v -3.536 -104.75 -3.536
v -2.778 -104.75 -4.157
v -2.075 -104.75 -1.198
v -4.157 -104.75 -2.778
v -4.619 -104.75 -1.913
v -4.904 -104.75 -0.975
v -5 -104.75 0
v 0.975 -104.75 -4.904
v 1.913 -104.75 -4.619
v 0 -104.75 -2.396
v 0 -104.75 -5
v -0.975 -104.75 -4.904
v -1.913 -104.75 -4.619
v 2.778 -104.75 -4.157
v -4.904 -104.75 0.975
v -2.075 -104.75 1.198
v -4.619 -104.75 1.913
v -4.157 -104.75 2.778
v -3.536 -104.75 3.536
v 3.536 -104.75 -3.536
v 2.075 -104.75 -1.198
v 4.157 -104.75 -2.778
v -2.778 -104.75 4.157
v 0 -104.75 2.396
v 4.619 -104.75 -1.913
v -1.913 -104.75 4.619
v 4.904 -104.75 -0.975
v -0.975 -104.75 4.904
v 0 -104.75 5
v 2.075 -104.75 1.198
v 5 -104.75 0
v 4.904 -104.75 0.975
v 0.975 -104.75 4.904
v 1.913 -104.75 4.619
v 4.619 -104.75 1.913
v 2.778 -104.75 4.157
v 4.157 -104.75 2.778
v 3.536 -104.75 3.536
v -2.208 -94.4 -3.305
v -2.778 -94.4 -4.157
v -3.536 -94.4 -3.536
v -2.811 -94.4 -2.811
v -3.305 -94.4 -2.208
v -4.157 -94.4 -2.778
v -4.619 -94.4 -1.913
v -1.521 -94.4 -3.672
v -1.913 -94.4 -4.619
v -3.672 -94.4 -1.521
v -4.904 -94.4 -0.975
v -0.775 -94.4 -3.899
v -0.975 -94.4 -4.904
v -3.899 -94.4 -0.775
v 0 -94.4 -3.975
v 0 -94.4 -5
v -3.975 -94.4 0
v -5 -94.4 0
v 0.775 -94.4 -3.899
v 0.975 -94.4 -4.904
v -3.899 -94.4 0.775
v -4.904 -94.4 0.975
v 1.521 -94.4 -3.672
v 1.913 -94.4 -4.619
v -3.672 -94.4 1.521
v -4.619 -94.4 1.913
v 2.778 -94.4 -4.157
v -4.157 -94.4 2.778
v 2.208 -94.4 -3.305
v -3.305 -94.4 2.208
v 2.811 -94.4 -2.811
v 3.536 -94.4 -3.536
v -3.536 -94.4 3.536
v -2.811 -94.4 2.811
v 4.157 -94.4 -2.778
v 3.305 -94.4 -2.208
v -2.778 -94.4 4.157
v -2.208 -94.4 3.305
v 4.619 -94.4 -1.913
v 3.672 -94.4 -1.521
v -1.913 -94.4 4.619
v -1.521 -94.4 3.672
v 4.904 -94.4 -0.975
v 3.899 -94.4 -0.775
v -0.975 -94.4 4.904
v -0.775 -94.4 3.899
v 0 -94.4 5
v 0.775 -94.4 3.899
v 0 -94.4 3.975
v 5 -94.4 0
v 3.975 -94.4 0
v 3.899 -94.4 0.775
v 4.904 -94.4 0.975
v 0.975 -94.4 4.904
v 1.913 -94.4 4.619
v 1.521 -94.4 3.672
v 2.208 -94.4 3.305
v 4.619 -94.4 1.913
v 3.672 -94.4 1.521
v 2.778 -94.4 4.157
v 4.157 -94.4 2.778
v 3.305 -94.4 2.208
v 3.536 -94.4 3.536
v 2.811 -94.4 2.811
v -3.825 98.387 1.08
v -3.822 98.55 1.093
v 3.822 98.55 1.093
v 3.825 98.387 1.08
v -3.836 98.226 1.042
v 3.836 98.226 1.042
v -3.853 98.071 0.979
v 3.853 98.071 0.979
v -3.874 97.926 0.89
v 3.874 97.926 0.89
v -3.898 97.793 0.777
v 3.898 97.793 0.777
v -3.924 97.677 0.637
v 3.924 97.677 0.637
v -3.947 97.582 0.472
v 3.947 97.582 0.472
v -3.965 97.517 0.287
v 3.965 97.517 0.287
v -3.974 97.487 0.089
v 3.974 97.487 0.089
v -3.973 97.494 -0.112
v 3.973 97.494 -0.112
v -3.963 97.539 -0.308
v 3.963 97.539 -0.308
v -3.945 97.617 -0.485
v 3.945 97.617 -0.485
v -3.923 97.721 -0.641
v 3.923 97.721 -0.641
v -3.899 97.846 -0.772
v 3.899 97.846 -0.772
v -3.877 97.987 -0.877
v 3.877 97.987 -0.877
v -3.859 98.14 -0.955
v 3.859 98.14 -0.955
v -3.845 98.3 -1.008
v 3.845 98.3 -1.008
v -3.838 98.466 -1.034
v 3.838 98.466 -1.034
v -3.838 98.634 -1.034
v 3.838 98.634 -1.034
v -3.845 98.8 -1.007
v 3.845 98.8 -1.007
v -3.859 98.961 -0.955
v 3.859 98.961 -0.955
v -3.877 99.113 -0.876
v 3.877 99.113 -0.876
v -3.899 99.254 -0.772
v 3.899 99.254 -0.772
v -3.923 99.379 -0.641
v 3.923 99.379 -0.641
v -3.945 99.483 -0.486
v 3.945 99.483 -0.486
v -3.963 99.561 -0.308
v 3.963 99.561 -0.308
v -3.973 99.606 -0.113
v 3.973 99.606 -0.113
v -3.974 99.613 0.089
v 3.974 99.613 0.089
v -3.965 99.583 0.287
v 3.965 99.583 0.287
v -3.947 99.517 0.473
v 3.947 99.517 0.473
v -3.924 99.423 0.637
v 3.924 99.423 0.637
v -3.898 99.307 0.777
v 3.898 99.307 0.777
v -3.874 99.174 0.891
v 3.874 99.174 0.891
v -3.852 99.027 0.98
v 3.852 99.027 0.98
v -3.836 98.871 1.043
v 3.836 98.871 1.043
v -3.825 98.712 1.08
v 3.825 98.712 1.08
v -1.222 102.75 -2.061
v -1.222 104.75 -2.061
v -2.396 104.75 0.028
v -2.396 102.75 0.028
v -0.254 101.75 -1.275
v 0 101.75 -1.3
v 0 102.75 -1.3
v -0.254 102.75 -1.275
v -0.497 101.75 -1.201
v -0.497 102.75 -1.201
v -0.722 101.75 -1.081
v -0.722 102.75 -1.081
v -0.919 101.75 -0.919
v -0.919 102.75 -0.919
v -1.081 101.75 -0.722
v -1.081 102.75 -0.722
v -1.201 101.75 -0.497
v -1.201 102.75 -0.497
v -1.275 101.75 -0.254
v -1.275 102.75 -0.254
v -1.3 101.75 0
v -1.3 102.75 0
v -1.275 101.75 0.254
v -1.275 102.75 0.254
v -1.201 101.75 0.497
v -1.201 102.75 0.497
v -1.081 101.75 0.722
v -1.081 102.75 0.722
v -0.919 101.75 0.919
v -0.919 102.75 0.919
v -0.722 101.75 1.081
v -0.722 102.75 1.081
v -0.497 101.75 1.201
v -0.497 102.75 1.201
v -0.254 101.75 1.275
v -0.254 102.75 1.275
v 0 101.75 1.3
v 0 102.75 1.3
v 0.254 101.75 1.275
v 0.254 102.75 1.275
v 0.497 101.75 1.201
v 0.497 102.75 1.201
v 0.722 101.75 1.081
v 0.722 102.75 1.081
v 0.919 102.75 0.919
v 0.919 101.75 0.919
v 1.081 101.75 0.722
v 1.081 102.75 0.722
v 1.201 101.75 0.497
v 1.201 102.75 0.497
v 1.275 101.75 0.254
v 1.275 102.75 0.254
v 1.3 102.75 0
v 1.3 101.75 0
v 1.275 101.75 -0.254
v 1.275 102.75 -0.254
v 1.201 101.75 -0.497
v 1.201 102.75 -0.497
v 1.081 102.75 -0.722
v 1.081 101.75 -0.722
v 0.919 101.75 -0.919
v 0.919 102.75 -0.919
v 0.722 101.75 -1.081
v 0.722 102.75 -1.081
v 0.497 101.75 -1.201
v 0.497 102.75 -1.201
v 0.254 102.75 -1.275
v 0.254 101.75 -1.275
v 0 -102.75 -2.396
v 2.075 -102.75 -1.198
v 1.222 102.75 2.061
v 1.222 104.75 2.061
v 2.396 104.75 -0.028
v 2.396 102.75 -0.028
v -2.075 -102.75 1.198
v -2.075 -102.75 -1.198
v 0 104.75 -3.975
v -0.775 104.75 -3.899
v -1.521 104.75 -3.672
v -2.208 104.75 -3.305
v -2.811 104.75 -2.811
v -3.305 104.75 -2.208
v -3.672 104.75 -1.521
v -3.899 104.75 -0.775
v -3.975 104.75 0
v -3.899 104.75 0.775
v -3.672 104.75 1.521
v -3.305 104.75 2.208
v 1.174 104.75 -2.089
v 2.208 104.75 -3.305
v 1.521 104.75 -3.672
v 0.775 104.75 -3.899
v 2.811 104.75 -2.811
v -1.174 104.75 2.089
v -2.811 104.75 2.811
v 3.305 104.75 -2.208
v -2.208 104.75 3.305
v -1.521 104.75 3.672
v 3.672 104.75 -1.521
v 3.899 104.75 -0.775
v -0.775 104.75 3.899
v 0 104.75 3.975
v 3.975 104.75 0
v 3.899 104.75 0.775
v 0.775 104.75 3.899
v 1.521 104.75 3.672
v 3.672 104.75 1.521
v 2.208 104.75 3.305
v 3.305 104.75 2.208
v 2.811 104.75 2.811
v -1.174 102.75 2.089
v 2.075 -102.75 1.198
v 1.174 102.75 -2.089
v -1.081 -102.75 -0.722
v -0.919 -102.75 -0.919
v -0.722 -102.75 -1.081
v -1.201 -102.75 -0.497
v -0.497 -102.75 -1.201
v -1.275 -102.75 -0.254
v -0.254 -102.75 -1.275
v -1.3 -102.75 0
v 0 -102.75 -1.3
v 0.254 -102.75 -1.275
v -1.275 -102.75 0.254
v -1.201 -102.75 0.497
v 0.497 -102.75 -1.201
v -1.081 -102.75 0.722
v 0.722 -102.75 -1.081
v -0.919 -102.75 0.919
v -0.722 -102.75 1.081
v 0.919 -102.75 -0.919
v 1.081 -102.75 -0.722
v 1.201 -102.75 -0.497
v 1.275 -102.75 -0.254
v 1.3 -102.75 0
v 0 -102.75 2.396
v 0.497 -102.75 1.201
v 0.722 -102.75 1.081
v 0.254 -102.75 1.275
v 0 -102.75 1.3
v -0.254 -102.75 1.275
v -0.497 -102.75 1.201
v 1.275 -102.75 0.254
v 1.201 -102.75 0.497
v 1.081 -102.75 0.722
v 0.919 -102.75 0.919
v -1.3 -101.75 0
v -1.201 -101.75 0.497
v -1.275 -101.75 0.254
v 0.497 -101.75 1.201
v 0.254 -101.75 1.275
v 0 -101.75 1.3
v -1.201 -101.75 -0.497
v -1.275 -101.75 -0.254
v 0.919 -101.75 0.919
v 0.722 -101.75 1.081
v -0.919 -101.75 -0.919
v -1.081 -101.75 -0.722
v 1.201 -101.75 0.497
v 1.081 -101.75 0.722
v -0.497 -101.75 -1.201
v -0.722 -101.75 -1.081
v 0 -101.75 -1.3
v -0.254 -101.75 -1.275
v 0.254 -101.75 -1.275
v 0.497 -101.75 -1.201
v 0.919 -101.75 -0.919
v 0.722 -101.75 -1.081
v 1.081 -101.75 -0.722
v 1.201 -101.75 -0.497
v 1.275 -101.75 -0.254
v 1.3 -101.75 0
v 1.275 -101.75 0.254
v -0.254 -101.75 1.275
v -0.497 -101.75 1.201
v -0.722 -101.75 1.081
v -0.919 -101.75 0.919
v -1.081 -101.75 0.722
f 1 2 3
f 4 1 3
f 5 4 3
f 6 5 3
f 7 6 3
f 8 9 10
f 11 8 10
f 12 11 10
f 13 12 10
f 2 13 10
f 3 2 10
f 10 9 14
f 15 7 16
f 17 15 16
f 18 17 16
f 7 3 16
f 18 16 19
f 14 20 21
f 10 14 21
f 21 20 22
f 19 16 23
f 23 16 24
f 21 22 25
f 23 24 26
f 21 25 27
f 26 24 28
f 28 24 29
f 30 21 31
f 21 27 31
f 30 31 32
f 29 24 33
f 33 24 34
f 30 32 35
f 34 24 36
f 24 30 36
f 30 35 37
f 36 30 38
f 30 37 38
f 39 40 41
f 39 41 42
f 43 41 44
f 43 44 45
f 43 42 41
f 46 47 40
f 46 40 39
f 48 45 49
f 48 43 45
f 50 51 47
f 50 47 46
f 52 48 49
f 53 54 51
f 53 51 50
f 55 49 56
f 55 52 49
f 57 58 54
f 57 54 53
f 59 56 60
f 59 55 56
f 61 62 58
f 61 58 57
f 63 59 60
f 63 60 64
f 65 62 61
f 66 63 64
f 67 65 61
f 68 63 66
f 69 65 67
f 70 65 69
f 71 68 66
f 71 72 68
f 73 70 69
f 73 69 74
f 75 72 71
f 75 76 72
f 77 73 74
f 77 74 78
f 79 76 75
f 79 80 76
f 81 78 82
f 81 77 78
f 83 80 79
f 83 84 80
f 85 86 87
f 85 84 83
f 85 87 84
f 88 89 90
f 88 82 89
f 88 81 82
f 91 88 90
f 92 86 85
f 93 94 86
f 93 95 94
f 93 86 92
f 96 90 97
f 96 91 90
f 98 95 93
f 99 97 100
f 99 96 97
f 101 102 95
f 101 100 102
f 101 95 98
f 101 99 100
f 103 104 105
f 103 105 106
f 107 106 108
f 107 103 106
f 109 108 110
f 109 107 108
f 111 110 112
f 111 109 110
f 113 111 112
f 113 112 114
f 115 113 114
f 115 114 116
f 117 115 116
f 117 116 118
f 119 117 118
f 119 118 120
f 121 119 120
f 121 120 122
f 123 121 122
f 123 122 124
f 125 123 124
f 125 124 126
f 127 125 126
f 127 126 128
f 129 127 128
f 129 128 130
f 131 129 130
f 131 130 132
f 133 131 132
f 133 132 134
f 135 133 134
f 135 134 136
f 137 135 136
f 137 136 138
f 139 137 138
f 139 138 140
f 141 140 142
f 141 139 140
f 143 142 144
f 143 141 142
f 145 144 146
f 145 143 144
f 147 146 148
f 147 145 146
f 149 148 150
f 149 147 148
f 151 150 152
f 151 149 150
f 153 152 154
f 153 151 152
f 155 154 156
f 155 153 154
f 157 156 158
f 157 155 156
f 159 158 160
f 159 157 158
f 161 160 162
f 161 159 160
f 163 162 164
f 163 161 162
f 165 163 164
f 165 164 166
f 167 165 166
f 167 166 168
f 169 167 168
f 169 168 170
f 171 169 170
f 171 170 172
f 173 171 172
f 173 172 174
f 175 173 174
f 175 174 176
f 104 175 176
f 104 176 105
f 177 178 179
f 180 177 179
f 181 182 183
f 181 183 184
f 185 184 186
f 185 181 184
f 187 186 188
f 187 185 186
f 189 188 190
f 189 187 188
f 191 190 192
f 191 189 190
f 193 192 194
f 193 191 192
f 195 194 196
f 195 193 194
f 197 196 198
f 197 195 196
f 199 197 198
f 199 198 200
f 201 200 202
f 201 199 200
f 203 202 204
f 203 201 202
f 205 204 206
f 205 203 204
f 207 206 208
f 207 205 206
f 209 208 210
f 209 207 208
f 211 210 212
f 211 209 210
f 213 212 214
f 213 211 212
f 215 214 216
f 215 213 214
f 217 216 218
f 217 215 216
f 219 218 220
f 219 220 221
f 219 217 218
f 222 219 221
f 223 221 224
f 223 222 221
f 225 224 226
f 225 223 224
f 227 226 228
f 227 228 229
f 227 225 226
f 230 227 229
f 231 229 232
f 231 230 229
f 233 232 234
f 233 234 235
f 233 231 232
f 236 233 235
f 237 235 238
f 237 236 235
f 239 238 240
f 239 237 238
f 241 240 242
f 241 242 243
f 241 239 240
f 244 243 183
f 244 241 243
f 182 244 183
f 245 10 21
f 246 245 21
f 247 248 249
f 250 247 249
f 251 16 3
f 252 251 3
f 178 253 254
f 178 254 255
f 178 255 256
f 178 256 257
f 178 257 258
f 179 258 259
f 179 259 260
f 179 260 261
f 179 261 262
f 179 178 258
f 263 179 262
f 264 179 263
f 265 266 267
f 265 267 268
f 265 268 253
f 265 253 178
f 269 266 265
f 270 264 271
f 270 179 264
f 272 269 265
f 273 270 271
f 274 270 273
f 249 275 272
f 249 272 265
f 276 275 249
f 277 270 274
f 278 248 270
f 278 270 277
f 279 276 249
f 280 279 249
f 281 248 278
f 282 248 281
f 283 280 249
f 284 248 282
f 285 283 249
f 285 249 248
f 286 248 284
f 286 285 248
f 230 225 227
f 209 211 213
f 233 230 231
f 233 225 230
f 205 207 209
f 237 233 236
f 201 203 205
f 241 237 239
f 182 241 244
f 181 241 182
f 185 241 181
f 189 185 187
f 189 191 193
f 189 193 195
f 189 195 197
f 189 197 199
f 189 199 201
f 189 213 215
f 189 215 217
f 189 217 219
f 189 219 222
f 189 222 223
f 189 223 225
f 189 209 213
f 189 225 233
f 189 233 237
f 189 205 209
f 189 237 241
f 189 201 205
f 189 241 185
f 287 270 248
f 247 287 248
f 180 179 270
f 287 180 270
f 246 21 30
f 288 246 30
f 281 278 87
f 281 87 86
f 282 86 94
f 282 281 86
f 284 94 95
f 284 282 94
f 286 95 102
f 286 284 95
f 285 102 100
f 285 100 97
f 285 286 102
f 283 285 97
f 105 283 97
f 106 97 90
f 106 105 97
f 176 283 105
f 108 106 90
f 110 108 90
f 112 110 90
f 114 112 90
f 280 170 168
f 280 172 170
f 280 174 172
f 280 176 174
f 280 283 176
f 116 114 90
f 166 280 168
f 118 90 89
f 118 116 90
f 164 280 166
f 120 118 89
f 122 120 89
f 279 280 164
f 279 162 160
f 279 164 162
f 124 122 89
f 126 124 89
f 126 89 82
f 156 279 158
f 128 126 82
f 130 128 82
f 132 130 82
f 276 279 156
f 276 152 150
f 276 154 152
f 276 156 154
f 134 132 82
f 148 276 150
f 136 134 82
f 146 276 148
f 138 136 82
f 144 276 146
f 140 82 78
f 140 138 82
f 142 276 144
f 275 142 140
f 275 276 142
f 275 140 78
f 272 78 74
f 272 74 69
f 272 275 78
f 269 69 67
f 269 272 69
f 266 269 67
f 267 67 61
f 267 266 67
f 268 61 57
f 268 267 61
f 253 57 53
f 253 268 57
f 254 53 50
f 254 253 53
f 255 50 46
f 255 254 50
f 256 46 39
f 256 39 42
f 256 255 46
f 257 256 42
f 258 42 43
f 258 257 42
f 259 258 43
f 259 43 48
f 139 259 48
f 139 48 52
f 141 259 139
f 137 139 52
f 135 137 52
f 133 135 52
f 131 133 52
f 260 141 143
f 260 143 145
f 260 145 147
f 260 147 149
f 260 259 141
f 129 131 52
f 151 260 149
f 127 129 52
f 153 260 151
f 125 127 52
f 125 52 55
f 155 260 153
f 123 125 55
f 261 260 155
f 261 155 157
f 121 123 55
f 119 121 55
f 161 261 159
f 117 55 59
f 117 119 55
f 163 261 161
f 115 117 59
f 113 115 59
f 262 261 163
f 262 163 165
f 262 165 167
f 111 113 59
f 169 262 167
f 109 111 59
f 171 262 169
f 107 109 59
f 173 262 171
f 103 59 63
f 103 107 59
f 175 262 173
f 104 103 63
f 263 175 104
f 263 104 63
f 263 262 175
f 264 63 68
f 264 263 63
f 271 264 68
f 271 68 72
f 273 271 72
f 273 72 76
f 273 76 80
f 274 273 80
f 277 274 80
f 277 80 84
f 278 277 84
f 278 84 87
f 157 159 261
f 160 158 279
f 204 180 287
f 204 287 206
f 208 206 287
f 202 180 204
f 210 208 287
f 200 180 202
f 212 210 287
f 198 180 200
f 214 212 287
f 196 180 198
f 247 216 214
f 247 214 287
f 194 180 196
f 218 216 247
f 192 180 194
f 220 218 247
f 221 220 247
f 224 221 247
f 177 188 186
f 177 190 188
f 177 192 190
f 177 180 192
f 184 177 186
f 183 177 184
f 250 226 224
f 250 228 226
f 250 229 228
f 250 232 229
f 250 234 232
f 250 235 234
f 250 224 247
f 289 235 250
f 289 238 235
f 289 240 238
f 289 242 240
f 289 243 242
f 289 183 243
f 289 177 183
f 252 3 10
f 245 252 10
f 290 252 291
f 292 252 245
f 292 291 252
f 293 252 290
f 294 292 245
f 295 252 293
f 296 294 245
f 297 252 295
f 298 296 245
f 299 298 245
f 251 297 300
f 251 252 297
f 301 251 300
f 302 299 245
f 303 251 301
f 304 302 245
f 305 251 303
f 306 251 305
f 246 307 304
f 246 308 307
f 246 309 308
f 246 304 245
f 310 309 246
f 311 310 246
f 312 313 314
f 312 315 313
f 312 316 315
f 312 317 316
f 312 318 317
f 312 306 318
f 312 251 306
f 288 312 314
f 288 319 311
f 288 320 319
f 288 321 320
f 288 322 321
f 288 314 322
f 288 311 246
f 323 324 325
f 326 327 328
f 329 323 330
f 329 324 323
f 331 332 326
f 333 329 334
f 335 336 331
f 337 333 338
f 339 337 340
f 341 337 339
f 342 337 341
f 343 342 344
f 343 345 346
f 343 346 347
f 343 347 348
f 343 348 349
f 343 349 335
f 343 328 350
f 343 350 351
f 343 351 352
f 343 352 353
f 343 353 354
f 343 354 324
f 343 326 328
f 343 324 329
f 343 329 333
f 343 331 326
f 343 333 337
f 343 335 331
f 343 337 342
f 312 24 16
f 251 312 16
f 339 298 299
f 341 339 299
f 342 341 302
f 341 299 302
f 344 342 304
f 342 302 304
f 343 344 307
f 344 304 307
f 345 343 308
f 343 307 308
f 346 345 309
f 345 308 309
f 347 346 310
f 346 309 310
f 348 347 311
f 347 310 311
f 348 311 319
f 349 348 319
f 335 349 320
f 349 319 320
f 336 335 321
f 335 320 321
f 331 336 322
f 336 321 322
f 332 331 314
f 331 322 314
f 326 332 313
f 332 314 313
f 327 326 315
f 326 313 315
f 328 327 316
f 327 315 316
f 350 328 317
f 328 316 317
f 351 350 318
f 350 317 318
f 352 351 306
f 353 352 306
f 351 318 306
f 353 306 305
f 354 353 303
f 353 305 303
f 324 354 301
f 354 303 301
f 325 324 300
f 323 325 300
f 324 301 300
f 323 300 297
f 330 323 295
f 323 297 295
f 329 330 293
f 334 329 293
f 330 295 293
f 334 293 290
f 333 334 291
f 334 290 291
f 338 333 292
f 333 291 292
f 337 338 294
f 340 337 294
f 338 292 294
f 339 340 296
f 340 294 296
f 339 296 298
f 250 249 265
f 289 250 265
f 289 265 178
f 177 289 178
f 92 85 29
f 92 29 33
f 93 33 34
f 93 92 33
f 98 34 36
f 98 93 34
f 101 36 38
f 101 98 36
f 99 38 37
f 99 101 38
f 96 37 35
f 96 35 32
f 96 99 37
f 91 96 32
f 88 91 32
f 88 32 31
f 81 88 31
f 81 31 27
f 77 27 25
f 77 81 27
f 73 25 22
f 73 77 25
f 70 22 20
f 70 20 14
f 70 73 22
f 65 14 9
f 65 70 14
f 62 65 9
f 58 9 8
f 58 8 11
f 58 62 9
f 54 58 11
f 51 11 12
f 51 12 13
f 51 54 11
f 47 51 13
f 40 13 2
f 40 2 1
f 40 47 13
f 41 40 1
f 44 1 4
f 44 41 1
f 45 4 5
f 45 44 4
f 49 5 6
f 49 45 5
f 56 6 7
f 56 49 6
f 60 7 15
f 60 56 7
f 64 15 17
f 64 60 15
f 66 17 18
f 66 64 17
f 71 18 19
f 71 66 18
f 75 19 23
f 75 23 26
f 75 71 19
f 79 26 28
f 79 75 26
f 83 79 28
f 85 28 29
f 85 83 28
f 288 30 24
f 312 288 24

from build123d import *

# Parameters (mm, degrees)
SKETCH1_R               = 5
BOSS_EXTRUDE1_DEPTH     = 104.75
SKETCH5_R               = 5
SKETCH5_R_2             = 3.975
CUT_EXTRUDE3_DEPTH      = 199.15
CUT_EXTRUDE4_DEPTH      = 2
CUT_EXTRUDE5_DEPTH      = 2
SKETCH11_R              = 1.3
CUT_EXTRUDE6_DEPTH      = 1
CUT_EXTRUDE7_START      = -1
SKETCH12_R              = 1.3
CUT_EXTRUDE7_DEPTH      = 1
CUT_EXTRUDE8_DEPTH      = 105.988392216
CUT_EXTRUDE8_DEPTH_BACK = 105.988392216
SKETCH13_R              = 1.065


with BuildPart() as part:
    # Sketch1 → Boss-Extrude1 (new, symmetric)
    with BuildSketch(Plane(origin=(0, 0, 0), x_dir=(1, 0, 0), z_dir=(0, 1, 0))):
        with Locations(Location((0, 0, 0), (0, 0, 270))):
            Circle(SKETCH1_R)
    extrude(amount=BOSS_EXTRUDE1_DEPTH, both=True)

    # Sketch5 → Cut-Extrude3 (cut)
    with BuildSketch(Plane(origin=(0, 104.75, 0), x_dir=(1, 0, 0), z_dir=(0, 1, 0))):
        with Locations(Location((0, 0, 0), (0, 0, 270))):
            Circle(SKETCH5_R)
        with Locations(Location((0, 0, 0), (0, 0, 270))):
            Circle(SKETCH5_R_2, mode=Mode.SUBTRACT)
    extrude(amount=-CUT_EXTRUDE3_DEPTH, mode=Mode.SUBTRACT)

    # Sketch8 → Cut-Extrude4 (cut)
    with BuildSketch(Plane(origin=(0, 104.75, 0), x_dir=(1, 0, 0), z_dir=(0, 1, 0))):
        Polygon((1.173959492, 2.088696351), (-1.221884355, 2.061026918), (-2.395843846, -0.027669433), (-1.173959492, -2.088696351), (1.221884355, -2.061026918), (2.395843846, 0.027669433), align=None)
    extrude(amount=-CUT_EXTRUDE4_DEPTH, mode=Mode.SUBTRACT)

    # Sketch10 → Cut-Extrude5 (cut)
    with BuildSketch(Plane.XZ.offset(104.75)):
        Polygon((0, 2.396003617), (-2.075, 1.198001809), (-2.075, -1.198001809), (0, -2.396003617), (2.075, -1.198001809), (2.075, 1.198001809), align=None)
    extrude(amount=-CUT_EXTRUDE5_DEPTH, mode=Mode.SUBTRACT)

    # Sketch11 → Cut-Extrude6 (cut)
    with BuildSketch(Plane.XZ.offset(102.75)):
        with Locations(Location((0, 0, 0), (0, 0, 270))):
            Circle(SKETCH11_R)
    extrude(amount=-CUT_EXTRUDE6_DEPTH, mode=Mode.SUBTRACT)

    # Sketch12 → Cut-Extrude7 (cut)
    with BuildSketch(Plane(origin=(0, 102.75, 0), x_dir=(1, 0, 0), z_dir=(0, 1, 0)).offset(CUT_EXTRUDE7_START)):
        with Locations(Location((0, 0, 0), (0, 0, 90))):
            Circle(SKETCH12_R)
    extrude(amount=CUT_EXTRUDE7_DEPTH, mode=Mode.SUBTRACT)

    # Sketch13 → Cut-Extrude8 (cut, two sides: drawn at the far end of the back side and taken through both)
    with BuildSketch(Plane(origin=(0, 0, 0), x_dir=(0, 0, -1), z_dir=(1, 0, 0)).offset(-CUT_EXTRUDE8_DEPTH_BACK)):
        with Locations(Location((-0.027669433, 98.55, 0), (0, 0, 180))):
            Circle(SKETCH13_R)
    extrude(amount=CUT_EXTRUDE8_DEPTH + CUT_EXTRUDE8_DEPTH_BACK, mode=Mode.SUBTRACT)


solid = part.part
